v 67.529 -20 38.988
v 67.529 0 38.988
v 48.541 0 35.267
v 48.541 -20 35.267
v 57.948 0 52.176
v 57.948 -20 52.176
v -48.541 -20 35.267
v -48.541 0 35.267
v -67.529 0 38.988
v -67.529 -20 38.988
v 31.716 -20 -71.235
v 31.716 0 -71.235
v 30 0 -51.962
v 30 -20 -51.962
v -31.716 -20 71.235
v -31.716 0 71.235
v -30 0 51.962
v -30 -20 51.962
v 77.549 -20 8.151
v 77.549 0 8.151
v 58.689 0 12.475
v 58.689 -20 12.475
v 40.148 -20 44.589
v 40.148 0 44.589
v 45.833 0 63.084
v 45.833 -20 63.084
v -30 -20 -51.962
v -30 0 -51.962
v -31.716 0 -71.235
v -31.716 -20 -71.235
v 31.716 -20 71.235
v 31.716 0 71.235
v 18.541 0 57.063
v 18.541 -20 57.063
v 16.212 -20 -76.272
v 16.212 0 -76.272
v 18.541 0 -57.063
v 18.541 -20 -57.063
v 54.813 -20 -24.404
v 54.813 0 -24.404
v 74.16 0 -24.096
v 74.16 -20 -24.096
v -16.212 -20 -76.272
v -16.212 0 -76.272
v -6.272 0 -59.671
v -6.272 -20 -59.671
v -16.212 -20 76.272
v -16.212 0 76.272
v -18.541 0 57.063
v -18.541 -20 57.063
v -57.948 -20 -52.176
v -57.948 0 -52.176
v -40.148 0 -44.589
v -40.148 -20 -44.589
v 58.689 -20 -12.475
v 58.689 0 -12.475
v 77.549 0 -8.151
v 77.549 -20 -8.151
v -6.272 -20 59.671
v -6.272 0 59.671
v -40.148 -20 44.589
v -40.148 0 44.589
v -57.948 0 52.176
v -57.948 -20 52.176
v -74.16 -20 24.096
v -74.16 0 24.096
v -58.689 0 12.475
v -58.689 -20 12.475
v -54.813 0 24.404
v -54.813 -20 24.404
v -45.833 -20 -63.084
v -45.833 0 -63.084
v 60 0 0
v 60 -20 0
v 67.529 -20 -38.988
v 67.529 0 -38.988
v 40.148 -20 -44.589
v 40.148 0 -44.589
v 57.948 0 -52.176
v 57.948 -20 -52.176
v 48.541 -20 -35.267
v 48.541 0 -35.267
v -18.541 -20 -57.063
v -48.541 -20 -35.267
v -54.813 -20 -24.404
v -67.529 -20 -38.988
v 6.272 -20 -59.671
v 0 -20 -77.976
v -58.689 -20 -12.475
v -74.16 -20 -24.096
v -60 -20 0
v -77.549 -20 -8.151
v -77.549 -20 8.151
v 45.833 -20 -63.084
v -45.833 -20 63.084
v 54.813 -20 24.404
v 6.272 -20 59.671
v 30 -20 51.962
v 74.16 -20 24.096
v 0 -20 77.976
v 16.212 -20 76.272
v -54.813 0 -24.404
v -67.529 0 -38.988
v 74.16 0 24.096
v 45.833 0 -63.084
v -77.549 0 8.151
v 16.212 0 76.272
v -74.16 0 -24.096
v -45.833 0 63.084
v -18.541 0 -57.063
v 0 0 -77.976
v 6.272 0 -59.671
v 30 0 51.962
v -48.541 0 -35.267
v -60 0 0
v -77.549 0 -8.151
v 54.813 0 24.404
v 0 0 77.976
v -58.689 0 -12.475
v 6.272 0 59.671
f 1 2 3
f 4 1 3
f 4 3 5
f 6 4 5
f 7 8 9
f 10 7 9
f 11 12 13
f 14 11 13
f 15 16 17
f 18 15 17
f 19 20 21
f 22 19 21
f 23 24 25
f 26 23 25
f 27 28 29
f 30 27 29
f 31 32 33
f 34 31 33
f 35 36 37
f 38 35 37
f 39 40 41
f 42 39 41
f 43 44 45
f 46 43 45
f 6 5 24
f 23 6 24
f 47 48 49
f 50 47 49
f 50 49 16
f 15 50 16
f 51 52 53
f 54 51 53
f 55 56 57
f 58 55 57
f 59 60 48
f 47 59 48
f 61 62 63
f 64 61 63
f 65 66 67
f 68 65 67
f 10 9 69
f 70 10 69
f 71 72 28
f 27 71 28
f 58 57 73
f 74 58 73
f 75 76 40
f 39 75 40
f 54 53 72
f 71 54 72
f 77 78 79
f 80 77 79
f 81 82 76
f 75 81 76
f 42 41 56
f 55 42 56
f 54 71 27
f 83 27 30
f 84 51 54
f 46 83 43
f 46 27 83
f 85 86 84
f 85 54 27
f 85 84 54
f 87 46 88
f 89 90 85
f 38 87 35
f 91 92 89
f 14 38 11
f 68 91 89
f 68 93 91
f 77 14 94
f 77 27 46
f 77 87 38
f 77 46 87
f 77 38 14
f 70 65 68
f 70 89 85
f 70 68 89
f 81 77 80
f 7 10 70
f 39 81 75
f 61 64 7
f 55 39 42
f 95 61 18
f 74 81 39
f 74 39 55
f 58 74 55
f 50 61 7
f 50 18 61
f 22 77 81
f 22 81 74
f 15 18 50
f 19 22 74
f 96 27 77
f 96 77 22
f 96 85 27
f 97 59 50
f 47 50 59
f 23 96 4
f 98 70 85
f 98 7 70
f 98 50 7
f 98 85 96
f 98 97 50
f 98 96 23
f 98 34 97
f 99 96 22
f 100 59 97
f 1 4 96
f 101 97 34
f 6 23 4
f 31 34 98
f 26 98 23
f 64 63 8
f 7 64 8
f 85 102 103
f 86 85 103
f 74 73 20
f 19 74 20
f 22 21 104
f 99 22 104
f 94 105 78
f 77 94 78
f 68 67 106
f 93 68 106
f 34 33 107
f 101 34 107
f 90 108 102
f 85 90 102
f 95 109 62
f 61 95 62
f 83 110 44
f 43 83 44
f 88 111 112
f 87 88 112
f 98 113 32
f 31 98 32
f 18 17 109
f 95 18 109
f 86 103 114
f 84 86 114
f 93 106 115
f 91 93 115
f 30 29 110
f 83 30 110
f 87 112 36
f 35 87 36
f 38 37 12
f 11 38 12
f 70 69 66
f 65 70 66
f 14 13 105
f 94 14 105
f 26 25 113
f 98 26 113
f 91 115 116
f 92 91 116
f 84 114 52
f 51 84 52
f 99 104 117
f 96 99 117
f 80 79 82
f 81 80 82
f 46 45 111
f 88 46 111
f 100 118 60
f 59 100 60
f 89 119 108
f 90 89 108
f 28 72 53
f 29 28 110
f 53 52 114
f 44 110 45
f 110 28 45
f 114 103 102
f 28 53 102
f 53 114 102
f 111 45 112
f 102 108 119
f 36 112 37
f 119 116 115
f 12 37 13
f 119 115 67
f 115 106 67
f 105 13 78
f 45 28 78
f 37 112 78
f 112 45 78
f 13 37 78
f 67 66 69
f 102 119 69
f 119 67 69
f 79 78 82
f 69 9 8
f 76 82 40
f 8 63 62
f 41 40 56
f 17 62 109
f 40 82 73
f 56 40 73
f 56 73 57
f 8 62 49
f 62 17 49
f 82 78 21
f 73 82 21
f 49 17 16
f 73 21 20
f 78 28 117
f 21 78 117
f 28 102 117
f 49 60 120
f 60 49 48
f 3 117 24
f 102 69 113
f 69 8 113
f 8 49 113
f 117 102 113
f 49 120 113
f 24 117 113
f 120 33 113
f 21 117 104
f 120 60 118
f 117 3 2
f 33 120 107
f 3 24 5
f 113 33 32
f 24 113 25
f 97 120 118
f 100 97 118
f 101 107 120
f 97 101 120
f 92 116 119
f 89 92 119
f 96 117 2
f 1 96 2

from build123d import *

# Parameters (mm, degrees)
F0_R            = 60
F1_DEPTH        = 20
F3_DEPTH        = 20
F3_COPIES_COUNT = 30


# Not quite as in the source:
# - a pattern or mirror of a feature is missing from the dataset's text; its kind, count and spacing are read off the source's solid


with BuildPart() as f1:
    # F0 (on Front) → F1 (new body)
    with BuildSketch(Plane.XZ):
        Circle(F0_R)
    extrude(amount=F1_DEPTH)

    # F2 (on face) → F3 (join)
    with BuildSketch(Plane.XZ.offset(20)):
        Polygon((0, 77.9763460159), (-6.2717077961, 59.6713137221), (6.2717077961, 59.6713137221), align=None)
    f3 = extrude(amount=-F3_DEPTH)

    # F3_copies: F3 ×30 about axis
    f3_copies_axis = Axis((0, 0, 0), (0, 1, 0))
    for i in range(1, F3_COPIES_COUNT):
        add(f3.rotate(f3_copies_axis, i * 360 / F3_COPIES_COUNT))


solid = f1.part
